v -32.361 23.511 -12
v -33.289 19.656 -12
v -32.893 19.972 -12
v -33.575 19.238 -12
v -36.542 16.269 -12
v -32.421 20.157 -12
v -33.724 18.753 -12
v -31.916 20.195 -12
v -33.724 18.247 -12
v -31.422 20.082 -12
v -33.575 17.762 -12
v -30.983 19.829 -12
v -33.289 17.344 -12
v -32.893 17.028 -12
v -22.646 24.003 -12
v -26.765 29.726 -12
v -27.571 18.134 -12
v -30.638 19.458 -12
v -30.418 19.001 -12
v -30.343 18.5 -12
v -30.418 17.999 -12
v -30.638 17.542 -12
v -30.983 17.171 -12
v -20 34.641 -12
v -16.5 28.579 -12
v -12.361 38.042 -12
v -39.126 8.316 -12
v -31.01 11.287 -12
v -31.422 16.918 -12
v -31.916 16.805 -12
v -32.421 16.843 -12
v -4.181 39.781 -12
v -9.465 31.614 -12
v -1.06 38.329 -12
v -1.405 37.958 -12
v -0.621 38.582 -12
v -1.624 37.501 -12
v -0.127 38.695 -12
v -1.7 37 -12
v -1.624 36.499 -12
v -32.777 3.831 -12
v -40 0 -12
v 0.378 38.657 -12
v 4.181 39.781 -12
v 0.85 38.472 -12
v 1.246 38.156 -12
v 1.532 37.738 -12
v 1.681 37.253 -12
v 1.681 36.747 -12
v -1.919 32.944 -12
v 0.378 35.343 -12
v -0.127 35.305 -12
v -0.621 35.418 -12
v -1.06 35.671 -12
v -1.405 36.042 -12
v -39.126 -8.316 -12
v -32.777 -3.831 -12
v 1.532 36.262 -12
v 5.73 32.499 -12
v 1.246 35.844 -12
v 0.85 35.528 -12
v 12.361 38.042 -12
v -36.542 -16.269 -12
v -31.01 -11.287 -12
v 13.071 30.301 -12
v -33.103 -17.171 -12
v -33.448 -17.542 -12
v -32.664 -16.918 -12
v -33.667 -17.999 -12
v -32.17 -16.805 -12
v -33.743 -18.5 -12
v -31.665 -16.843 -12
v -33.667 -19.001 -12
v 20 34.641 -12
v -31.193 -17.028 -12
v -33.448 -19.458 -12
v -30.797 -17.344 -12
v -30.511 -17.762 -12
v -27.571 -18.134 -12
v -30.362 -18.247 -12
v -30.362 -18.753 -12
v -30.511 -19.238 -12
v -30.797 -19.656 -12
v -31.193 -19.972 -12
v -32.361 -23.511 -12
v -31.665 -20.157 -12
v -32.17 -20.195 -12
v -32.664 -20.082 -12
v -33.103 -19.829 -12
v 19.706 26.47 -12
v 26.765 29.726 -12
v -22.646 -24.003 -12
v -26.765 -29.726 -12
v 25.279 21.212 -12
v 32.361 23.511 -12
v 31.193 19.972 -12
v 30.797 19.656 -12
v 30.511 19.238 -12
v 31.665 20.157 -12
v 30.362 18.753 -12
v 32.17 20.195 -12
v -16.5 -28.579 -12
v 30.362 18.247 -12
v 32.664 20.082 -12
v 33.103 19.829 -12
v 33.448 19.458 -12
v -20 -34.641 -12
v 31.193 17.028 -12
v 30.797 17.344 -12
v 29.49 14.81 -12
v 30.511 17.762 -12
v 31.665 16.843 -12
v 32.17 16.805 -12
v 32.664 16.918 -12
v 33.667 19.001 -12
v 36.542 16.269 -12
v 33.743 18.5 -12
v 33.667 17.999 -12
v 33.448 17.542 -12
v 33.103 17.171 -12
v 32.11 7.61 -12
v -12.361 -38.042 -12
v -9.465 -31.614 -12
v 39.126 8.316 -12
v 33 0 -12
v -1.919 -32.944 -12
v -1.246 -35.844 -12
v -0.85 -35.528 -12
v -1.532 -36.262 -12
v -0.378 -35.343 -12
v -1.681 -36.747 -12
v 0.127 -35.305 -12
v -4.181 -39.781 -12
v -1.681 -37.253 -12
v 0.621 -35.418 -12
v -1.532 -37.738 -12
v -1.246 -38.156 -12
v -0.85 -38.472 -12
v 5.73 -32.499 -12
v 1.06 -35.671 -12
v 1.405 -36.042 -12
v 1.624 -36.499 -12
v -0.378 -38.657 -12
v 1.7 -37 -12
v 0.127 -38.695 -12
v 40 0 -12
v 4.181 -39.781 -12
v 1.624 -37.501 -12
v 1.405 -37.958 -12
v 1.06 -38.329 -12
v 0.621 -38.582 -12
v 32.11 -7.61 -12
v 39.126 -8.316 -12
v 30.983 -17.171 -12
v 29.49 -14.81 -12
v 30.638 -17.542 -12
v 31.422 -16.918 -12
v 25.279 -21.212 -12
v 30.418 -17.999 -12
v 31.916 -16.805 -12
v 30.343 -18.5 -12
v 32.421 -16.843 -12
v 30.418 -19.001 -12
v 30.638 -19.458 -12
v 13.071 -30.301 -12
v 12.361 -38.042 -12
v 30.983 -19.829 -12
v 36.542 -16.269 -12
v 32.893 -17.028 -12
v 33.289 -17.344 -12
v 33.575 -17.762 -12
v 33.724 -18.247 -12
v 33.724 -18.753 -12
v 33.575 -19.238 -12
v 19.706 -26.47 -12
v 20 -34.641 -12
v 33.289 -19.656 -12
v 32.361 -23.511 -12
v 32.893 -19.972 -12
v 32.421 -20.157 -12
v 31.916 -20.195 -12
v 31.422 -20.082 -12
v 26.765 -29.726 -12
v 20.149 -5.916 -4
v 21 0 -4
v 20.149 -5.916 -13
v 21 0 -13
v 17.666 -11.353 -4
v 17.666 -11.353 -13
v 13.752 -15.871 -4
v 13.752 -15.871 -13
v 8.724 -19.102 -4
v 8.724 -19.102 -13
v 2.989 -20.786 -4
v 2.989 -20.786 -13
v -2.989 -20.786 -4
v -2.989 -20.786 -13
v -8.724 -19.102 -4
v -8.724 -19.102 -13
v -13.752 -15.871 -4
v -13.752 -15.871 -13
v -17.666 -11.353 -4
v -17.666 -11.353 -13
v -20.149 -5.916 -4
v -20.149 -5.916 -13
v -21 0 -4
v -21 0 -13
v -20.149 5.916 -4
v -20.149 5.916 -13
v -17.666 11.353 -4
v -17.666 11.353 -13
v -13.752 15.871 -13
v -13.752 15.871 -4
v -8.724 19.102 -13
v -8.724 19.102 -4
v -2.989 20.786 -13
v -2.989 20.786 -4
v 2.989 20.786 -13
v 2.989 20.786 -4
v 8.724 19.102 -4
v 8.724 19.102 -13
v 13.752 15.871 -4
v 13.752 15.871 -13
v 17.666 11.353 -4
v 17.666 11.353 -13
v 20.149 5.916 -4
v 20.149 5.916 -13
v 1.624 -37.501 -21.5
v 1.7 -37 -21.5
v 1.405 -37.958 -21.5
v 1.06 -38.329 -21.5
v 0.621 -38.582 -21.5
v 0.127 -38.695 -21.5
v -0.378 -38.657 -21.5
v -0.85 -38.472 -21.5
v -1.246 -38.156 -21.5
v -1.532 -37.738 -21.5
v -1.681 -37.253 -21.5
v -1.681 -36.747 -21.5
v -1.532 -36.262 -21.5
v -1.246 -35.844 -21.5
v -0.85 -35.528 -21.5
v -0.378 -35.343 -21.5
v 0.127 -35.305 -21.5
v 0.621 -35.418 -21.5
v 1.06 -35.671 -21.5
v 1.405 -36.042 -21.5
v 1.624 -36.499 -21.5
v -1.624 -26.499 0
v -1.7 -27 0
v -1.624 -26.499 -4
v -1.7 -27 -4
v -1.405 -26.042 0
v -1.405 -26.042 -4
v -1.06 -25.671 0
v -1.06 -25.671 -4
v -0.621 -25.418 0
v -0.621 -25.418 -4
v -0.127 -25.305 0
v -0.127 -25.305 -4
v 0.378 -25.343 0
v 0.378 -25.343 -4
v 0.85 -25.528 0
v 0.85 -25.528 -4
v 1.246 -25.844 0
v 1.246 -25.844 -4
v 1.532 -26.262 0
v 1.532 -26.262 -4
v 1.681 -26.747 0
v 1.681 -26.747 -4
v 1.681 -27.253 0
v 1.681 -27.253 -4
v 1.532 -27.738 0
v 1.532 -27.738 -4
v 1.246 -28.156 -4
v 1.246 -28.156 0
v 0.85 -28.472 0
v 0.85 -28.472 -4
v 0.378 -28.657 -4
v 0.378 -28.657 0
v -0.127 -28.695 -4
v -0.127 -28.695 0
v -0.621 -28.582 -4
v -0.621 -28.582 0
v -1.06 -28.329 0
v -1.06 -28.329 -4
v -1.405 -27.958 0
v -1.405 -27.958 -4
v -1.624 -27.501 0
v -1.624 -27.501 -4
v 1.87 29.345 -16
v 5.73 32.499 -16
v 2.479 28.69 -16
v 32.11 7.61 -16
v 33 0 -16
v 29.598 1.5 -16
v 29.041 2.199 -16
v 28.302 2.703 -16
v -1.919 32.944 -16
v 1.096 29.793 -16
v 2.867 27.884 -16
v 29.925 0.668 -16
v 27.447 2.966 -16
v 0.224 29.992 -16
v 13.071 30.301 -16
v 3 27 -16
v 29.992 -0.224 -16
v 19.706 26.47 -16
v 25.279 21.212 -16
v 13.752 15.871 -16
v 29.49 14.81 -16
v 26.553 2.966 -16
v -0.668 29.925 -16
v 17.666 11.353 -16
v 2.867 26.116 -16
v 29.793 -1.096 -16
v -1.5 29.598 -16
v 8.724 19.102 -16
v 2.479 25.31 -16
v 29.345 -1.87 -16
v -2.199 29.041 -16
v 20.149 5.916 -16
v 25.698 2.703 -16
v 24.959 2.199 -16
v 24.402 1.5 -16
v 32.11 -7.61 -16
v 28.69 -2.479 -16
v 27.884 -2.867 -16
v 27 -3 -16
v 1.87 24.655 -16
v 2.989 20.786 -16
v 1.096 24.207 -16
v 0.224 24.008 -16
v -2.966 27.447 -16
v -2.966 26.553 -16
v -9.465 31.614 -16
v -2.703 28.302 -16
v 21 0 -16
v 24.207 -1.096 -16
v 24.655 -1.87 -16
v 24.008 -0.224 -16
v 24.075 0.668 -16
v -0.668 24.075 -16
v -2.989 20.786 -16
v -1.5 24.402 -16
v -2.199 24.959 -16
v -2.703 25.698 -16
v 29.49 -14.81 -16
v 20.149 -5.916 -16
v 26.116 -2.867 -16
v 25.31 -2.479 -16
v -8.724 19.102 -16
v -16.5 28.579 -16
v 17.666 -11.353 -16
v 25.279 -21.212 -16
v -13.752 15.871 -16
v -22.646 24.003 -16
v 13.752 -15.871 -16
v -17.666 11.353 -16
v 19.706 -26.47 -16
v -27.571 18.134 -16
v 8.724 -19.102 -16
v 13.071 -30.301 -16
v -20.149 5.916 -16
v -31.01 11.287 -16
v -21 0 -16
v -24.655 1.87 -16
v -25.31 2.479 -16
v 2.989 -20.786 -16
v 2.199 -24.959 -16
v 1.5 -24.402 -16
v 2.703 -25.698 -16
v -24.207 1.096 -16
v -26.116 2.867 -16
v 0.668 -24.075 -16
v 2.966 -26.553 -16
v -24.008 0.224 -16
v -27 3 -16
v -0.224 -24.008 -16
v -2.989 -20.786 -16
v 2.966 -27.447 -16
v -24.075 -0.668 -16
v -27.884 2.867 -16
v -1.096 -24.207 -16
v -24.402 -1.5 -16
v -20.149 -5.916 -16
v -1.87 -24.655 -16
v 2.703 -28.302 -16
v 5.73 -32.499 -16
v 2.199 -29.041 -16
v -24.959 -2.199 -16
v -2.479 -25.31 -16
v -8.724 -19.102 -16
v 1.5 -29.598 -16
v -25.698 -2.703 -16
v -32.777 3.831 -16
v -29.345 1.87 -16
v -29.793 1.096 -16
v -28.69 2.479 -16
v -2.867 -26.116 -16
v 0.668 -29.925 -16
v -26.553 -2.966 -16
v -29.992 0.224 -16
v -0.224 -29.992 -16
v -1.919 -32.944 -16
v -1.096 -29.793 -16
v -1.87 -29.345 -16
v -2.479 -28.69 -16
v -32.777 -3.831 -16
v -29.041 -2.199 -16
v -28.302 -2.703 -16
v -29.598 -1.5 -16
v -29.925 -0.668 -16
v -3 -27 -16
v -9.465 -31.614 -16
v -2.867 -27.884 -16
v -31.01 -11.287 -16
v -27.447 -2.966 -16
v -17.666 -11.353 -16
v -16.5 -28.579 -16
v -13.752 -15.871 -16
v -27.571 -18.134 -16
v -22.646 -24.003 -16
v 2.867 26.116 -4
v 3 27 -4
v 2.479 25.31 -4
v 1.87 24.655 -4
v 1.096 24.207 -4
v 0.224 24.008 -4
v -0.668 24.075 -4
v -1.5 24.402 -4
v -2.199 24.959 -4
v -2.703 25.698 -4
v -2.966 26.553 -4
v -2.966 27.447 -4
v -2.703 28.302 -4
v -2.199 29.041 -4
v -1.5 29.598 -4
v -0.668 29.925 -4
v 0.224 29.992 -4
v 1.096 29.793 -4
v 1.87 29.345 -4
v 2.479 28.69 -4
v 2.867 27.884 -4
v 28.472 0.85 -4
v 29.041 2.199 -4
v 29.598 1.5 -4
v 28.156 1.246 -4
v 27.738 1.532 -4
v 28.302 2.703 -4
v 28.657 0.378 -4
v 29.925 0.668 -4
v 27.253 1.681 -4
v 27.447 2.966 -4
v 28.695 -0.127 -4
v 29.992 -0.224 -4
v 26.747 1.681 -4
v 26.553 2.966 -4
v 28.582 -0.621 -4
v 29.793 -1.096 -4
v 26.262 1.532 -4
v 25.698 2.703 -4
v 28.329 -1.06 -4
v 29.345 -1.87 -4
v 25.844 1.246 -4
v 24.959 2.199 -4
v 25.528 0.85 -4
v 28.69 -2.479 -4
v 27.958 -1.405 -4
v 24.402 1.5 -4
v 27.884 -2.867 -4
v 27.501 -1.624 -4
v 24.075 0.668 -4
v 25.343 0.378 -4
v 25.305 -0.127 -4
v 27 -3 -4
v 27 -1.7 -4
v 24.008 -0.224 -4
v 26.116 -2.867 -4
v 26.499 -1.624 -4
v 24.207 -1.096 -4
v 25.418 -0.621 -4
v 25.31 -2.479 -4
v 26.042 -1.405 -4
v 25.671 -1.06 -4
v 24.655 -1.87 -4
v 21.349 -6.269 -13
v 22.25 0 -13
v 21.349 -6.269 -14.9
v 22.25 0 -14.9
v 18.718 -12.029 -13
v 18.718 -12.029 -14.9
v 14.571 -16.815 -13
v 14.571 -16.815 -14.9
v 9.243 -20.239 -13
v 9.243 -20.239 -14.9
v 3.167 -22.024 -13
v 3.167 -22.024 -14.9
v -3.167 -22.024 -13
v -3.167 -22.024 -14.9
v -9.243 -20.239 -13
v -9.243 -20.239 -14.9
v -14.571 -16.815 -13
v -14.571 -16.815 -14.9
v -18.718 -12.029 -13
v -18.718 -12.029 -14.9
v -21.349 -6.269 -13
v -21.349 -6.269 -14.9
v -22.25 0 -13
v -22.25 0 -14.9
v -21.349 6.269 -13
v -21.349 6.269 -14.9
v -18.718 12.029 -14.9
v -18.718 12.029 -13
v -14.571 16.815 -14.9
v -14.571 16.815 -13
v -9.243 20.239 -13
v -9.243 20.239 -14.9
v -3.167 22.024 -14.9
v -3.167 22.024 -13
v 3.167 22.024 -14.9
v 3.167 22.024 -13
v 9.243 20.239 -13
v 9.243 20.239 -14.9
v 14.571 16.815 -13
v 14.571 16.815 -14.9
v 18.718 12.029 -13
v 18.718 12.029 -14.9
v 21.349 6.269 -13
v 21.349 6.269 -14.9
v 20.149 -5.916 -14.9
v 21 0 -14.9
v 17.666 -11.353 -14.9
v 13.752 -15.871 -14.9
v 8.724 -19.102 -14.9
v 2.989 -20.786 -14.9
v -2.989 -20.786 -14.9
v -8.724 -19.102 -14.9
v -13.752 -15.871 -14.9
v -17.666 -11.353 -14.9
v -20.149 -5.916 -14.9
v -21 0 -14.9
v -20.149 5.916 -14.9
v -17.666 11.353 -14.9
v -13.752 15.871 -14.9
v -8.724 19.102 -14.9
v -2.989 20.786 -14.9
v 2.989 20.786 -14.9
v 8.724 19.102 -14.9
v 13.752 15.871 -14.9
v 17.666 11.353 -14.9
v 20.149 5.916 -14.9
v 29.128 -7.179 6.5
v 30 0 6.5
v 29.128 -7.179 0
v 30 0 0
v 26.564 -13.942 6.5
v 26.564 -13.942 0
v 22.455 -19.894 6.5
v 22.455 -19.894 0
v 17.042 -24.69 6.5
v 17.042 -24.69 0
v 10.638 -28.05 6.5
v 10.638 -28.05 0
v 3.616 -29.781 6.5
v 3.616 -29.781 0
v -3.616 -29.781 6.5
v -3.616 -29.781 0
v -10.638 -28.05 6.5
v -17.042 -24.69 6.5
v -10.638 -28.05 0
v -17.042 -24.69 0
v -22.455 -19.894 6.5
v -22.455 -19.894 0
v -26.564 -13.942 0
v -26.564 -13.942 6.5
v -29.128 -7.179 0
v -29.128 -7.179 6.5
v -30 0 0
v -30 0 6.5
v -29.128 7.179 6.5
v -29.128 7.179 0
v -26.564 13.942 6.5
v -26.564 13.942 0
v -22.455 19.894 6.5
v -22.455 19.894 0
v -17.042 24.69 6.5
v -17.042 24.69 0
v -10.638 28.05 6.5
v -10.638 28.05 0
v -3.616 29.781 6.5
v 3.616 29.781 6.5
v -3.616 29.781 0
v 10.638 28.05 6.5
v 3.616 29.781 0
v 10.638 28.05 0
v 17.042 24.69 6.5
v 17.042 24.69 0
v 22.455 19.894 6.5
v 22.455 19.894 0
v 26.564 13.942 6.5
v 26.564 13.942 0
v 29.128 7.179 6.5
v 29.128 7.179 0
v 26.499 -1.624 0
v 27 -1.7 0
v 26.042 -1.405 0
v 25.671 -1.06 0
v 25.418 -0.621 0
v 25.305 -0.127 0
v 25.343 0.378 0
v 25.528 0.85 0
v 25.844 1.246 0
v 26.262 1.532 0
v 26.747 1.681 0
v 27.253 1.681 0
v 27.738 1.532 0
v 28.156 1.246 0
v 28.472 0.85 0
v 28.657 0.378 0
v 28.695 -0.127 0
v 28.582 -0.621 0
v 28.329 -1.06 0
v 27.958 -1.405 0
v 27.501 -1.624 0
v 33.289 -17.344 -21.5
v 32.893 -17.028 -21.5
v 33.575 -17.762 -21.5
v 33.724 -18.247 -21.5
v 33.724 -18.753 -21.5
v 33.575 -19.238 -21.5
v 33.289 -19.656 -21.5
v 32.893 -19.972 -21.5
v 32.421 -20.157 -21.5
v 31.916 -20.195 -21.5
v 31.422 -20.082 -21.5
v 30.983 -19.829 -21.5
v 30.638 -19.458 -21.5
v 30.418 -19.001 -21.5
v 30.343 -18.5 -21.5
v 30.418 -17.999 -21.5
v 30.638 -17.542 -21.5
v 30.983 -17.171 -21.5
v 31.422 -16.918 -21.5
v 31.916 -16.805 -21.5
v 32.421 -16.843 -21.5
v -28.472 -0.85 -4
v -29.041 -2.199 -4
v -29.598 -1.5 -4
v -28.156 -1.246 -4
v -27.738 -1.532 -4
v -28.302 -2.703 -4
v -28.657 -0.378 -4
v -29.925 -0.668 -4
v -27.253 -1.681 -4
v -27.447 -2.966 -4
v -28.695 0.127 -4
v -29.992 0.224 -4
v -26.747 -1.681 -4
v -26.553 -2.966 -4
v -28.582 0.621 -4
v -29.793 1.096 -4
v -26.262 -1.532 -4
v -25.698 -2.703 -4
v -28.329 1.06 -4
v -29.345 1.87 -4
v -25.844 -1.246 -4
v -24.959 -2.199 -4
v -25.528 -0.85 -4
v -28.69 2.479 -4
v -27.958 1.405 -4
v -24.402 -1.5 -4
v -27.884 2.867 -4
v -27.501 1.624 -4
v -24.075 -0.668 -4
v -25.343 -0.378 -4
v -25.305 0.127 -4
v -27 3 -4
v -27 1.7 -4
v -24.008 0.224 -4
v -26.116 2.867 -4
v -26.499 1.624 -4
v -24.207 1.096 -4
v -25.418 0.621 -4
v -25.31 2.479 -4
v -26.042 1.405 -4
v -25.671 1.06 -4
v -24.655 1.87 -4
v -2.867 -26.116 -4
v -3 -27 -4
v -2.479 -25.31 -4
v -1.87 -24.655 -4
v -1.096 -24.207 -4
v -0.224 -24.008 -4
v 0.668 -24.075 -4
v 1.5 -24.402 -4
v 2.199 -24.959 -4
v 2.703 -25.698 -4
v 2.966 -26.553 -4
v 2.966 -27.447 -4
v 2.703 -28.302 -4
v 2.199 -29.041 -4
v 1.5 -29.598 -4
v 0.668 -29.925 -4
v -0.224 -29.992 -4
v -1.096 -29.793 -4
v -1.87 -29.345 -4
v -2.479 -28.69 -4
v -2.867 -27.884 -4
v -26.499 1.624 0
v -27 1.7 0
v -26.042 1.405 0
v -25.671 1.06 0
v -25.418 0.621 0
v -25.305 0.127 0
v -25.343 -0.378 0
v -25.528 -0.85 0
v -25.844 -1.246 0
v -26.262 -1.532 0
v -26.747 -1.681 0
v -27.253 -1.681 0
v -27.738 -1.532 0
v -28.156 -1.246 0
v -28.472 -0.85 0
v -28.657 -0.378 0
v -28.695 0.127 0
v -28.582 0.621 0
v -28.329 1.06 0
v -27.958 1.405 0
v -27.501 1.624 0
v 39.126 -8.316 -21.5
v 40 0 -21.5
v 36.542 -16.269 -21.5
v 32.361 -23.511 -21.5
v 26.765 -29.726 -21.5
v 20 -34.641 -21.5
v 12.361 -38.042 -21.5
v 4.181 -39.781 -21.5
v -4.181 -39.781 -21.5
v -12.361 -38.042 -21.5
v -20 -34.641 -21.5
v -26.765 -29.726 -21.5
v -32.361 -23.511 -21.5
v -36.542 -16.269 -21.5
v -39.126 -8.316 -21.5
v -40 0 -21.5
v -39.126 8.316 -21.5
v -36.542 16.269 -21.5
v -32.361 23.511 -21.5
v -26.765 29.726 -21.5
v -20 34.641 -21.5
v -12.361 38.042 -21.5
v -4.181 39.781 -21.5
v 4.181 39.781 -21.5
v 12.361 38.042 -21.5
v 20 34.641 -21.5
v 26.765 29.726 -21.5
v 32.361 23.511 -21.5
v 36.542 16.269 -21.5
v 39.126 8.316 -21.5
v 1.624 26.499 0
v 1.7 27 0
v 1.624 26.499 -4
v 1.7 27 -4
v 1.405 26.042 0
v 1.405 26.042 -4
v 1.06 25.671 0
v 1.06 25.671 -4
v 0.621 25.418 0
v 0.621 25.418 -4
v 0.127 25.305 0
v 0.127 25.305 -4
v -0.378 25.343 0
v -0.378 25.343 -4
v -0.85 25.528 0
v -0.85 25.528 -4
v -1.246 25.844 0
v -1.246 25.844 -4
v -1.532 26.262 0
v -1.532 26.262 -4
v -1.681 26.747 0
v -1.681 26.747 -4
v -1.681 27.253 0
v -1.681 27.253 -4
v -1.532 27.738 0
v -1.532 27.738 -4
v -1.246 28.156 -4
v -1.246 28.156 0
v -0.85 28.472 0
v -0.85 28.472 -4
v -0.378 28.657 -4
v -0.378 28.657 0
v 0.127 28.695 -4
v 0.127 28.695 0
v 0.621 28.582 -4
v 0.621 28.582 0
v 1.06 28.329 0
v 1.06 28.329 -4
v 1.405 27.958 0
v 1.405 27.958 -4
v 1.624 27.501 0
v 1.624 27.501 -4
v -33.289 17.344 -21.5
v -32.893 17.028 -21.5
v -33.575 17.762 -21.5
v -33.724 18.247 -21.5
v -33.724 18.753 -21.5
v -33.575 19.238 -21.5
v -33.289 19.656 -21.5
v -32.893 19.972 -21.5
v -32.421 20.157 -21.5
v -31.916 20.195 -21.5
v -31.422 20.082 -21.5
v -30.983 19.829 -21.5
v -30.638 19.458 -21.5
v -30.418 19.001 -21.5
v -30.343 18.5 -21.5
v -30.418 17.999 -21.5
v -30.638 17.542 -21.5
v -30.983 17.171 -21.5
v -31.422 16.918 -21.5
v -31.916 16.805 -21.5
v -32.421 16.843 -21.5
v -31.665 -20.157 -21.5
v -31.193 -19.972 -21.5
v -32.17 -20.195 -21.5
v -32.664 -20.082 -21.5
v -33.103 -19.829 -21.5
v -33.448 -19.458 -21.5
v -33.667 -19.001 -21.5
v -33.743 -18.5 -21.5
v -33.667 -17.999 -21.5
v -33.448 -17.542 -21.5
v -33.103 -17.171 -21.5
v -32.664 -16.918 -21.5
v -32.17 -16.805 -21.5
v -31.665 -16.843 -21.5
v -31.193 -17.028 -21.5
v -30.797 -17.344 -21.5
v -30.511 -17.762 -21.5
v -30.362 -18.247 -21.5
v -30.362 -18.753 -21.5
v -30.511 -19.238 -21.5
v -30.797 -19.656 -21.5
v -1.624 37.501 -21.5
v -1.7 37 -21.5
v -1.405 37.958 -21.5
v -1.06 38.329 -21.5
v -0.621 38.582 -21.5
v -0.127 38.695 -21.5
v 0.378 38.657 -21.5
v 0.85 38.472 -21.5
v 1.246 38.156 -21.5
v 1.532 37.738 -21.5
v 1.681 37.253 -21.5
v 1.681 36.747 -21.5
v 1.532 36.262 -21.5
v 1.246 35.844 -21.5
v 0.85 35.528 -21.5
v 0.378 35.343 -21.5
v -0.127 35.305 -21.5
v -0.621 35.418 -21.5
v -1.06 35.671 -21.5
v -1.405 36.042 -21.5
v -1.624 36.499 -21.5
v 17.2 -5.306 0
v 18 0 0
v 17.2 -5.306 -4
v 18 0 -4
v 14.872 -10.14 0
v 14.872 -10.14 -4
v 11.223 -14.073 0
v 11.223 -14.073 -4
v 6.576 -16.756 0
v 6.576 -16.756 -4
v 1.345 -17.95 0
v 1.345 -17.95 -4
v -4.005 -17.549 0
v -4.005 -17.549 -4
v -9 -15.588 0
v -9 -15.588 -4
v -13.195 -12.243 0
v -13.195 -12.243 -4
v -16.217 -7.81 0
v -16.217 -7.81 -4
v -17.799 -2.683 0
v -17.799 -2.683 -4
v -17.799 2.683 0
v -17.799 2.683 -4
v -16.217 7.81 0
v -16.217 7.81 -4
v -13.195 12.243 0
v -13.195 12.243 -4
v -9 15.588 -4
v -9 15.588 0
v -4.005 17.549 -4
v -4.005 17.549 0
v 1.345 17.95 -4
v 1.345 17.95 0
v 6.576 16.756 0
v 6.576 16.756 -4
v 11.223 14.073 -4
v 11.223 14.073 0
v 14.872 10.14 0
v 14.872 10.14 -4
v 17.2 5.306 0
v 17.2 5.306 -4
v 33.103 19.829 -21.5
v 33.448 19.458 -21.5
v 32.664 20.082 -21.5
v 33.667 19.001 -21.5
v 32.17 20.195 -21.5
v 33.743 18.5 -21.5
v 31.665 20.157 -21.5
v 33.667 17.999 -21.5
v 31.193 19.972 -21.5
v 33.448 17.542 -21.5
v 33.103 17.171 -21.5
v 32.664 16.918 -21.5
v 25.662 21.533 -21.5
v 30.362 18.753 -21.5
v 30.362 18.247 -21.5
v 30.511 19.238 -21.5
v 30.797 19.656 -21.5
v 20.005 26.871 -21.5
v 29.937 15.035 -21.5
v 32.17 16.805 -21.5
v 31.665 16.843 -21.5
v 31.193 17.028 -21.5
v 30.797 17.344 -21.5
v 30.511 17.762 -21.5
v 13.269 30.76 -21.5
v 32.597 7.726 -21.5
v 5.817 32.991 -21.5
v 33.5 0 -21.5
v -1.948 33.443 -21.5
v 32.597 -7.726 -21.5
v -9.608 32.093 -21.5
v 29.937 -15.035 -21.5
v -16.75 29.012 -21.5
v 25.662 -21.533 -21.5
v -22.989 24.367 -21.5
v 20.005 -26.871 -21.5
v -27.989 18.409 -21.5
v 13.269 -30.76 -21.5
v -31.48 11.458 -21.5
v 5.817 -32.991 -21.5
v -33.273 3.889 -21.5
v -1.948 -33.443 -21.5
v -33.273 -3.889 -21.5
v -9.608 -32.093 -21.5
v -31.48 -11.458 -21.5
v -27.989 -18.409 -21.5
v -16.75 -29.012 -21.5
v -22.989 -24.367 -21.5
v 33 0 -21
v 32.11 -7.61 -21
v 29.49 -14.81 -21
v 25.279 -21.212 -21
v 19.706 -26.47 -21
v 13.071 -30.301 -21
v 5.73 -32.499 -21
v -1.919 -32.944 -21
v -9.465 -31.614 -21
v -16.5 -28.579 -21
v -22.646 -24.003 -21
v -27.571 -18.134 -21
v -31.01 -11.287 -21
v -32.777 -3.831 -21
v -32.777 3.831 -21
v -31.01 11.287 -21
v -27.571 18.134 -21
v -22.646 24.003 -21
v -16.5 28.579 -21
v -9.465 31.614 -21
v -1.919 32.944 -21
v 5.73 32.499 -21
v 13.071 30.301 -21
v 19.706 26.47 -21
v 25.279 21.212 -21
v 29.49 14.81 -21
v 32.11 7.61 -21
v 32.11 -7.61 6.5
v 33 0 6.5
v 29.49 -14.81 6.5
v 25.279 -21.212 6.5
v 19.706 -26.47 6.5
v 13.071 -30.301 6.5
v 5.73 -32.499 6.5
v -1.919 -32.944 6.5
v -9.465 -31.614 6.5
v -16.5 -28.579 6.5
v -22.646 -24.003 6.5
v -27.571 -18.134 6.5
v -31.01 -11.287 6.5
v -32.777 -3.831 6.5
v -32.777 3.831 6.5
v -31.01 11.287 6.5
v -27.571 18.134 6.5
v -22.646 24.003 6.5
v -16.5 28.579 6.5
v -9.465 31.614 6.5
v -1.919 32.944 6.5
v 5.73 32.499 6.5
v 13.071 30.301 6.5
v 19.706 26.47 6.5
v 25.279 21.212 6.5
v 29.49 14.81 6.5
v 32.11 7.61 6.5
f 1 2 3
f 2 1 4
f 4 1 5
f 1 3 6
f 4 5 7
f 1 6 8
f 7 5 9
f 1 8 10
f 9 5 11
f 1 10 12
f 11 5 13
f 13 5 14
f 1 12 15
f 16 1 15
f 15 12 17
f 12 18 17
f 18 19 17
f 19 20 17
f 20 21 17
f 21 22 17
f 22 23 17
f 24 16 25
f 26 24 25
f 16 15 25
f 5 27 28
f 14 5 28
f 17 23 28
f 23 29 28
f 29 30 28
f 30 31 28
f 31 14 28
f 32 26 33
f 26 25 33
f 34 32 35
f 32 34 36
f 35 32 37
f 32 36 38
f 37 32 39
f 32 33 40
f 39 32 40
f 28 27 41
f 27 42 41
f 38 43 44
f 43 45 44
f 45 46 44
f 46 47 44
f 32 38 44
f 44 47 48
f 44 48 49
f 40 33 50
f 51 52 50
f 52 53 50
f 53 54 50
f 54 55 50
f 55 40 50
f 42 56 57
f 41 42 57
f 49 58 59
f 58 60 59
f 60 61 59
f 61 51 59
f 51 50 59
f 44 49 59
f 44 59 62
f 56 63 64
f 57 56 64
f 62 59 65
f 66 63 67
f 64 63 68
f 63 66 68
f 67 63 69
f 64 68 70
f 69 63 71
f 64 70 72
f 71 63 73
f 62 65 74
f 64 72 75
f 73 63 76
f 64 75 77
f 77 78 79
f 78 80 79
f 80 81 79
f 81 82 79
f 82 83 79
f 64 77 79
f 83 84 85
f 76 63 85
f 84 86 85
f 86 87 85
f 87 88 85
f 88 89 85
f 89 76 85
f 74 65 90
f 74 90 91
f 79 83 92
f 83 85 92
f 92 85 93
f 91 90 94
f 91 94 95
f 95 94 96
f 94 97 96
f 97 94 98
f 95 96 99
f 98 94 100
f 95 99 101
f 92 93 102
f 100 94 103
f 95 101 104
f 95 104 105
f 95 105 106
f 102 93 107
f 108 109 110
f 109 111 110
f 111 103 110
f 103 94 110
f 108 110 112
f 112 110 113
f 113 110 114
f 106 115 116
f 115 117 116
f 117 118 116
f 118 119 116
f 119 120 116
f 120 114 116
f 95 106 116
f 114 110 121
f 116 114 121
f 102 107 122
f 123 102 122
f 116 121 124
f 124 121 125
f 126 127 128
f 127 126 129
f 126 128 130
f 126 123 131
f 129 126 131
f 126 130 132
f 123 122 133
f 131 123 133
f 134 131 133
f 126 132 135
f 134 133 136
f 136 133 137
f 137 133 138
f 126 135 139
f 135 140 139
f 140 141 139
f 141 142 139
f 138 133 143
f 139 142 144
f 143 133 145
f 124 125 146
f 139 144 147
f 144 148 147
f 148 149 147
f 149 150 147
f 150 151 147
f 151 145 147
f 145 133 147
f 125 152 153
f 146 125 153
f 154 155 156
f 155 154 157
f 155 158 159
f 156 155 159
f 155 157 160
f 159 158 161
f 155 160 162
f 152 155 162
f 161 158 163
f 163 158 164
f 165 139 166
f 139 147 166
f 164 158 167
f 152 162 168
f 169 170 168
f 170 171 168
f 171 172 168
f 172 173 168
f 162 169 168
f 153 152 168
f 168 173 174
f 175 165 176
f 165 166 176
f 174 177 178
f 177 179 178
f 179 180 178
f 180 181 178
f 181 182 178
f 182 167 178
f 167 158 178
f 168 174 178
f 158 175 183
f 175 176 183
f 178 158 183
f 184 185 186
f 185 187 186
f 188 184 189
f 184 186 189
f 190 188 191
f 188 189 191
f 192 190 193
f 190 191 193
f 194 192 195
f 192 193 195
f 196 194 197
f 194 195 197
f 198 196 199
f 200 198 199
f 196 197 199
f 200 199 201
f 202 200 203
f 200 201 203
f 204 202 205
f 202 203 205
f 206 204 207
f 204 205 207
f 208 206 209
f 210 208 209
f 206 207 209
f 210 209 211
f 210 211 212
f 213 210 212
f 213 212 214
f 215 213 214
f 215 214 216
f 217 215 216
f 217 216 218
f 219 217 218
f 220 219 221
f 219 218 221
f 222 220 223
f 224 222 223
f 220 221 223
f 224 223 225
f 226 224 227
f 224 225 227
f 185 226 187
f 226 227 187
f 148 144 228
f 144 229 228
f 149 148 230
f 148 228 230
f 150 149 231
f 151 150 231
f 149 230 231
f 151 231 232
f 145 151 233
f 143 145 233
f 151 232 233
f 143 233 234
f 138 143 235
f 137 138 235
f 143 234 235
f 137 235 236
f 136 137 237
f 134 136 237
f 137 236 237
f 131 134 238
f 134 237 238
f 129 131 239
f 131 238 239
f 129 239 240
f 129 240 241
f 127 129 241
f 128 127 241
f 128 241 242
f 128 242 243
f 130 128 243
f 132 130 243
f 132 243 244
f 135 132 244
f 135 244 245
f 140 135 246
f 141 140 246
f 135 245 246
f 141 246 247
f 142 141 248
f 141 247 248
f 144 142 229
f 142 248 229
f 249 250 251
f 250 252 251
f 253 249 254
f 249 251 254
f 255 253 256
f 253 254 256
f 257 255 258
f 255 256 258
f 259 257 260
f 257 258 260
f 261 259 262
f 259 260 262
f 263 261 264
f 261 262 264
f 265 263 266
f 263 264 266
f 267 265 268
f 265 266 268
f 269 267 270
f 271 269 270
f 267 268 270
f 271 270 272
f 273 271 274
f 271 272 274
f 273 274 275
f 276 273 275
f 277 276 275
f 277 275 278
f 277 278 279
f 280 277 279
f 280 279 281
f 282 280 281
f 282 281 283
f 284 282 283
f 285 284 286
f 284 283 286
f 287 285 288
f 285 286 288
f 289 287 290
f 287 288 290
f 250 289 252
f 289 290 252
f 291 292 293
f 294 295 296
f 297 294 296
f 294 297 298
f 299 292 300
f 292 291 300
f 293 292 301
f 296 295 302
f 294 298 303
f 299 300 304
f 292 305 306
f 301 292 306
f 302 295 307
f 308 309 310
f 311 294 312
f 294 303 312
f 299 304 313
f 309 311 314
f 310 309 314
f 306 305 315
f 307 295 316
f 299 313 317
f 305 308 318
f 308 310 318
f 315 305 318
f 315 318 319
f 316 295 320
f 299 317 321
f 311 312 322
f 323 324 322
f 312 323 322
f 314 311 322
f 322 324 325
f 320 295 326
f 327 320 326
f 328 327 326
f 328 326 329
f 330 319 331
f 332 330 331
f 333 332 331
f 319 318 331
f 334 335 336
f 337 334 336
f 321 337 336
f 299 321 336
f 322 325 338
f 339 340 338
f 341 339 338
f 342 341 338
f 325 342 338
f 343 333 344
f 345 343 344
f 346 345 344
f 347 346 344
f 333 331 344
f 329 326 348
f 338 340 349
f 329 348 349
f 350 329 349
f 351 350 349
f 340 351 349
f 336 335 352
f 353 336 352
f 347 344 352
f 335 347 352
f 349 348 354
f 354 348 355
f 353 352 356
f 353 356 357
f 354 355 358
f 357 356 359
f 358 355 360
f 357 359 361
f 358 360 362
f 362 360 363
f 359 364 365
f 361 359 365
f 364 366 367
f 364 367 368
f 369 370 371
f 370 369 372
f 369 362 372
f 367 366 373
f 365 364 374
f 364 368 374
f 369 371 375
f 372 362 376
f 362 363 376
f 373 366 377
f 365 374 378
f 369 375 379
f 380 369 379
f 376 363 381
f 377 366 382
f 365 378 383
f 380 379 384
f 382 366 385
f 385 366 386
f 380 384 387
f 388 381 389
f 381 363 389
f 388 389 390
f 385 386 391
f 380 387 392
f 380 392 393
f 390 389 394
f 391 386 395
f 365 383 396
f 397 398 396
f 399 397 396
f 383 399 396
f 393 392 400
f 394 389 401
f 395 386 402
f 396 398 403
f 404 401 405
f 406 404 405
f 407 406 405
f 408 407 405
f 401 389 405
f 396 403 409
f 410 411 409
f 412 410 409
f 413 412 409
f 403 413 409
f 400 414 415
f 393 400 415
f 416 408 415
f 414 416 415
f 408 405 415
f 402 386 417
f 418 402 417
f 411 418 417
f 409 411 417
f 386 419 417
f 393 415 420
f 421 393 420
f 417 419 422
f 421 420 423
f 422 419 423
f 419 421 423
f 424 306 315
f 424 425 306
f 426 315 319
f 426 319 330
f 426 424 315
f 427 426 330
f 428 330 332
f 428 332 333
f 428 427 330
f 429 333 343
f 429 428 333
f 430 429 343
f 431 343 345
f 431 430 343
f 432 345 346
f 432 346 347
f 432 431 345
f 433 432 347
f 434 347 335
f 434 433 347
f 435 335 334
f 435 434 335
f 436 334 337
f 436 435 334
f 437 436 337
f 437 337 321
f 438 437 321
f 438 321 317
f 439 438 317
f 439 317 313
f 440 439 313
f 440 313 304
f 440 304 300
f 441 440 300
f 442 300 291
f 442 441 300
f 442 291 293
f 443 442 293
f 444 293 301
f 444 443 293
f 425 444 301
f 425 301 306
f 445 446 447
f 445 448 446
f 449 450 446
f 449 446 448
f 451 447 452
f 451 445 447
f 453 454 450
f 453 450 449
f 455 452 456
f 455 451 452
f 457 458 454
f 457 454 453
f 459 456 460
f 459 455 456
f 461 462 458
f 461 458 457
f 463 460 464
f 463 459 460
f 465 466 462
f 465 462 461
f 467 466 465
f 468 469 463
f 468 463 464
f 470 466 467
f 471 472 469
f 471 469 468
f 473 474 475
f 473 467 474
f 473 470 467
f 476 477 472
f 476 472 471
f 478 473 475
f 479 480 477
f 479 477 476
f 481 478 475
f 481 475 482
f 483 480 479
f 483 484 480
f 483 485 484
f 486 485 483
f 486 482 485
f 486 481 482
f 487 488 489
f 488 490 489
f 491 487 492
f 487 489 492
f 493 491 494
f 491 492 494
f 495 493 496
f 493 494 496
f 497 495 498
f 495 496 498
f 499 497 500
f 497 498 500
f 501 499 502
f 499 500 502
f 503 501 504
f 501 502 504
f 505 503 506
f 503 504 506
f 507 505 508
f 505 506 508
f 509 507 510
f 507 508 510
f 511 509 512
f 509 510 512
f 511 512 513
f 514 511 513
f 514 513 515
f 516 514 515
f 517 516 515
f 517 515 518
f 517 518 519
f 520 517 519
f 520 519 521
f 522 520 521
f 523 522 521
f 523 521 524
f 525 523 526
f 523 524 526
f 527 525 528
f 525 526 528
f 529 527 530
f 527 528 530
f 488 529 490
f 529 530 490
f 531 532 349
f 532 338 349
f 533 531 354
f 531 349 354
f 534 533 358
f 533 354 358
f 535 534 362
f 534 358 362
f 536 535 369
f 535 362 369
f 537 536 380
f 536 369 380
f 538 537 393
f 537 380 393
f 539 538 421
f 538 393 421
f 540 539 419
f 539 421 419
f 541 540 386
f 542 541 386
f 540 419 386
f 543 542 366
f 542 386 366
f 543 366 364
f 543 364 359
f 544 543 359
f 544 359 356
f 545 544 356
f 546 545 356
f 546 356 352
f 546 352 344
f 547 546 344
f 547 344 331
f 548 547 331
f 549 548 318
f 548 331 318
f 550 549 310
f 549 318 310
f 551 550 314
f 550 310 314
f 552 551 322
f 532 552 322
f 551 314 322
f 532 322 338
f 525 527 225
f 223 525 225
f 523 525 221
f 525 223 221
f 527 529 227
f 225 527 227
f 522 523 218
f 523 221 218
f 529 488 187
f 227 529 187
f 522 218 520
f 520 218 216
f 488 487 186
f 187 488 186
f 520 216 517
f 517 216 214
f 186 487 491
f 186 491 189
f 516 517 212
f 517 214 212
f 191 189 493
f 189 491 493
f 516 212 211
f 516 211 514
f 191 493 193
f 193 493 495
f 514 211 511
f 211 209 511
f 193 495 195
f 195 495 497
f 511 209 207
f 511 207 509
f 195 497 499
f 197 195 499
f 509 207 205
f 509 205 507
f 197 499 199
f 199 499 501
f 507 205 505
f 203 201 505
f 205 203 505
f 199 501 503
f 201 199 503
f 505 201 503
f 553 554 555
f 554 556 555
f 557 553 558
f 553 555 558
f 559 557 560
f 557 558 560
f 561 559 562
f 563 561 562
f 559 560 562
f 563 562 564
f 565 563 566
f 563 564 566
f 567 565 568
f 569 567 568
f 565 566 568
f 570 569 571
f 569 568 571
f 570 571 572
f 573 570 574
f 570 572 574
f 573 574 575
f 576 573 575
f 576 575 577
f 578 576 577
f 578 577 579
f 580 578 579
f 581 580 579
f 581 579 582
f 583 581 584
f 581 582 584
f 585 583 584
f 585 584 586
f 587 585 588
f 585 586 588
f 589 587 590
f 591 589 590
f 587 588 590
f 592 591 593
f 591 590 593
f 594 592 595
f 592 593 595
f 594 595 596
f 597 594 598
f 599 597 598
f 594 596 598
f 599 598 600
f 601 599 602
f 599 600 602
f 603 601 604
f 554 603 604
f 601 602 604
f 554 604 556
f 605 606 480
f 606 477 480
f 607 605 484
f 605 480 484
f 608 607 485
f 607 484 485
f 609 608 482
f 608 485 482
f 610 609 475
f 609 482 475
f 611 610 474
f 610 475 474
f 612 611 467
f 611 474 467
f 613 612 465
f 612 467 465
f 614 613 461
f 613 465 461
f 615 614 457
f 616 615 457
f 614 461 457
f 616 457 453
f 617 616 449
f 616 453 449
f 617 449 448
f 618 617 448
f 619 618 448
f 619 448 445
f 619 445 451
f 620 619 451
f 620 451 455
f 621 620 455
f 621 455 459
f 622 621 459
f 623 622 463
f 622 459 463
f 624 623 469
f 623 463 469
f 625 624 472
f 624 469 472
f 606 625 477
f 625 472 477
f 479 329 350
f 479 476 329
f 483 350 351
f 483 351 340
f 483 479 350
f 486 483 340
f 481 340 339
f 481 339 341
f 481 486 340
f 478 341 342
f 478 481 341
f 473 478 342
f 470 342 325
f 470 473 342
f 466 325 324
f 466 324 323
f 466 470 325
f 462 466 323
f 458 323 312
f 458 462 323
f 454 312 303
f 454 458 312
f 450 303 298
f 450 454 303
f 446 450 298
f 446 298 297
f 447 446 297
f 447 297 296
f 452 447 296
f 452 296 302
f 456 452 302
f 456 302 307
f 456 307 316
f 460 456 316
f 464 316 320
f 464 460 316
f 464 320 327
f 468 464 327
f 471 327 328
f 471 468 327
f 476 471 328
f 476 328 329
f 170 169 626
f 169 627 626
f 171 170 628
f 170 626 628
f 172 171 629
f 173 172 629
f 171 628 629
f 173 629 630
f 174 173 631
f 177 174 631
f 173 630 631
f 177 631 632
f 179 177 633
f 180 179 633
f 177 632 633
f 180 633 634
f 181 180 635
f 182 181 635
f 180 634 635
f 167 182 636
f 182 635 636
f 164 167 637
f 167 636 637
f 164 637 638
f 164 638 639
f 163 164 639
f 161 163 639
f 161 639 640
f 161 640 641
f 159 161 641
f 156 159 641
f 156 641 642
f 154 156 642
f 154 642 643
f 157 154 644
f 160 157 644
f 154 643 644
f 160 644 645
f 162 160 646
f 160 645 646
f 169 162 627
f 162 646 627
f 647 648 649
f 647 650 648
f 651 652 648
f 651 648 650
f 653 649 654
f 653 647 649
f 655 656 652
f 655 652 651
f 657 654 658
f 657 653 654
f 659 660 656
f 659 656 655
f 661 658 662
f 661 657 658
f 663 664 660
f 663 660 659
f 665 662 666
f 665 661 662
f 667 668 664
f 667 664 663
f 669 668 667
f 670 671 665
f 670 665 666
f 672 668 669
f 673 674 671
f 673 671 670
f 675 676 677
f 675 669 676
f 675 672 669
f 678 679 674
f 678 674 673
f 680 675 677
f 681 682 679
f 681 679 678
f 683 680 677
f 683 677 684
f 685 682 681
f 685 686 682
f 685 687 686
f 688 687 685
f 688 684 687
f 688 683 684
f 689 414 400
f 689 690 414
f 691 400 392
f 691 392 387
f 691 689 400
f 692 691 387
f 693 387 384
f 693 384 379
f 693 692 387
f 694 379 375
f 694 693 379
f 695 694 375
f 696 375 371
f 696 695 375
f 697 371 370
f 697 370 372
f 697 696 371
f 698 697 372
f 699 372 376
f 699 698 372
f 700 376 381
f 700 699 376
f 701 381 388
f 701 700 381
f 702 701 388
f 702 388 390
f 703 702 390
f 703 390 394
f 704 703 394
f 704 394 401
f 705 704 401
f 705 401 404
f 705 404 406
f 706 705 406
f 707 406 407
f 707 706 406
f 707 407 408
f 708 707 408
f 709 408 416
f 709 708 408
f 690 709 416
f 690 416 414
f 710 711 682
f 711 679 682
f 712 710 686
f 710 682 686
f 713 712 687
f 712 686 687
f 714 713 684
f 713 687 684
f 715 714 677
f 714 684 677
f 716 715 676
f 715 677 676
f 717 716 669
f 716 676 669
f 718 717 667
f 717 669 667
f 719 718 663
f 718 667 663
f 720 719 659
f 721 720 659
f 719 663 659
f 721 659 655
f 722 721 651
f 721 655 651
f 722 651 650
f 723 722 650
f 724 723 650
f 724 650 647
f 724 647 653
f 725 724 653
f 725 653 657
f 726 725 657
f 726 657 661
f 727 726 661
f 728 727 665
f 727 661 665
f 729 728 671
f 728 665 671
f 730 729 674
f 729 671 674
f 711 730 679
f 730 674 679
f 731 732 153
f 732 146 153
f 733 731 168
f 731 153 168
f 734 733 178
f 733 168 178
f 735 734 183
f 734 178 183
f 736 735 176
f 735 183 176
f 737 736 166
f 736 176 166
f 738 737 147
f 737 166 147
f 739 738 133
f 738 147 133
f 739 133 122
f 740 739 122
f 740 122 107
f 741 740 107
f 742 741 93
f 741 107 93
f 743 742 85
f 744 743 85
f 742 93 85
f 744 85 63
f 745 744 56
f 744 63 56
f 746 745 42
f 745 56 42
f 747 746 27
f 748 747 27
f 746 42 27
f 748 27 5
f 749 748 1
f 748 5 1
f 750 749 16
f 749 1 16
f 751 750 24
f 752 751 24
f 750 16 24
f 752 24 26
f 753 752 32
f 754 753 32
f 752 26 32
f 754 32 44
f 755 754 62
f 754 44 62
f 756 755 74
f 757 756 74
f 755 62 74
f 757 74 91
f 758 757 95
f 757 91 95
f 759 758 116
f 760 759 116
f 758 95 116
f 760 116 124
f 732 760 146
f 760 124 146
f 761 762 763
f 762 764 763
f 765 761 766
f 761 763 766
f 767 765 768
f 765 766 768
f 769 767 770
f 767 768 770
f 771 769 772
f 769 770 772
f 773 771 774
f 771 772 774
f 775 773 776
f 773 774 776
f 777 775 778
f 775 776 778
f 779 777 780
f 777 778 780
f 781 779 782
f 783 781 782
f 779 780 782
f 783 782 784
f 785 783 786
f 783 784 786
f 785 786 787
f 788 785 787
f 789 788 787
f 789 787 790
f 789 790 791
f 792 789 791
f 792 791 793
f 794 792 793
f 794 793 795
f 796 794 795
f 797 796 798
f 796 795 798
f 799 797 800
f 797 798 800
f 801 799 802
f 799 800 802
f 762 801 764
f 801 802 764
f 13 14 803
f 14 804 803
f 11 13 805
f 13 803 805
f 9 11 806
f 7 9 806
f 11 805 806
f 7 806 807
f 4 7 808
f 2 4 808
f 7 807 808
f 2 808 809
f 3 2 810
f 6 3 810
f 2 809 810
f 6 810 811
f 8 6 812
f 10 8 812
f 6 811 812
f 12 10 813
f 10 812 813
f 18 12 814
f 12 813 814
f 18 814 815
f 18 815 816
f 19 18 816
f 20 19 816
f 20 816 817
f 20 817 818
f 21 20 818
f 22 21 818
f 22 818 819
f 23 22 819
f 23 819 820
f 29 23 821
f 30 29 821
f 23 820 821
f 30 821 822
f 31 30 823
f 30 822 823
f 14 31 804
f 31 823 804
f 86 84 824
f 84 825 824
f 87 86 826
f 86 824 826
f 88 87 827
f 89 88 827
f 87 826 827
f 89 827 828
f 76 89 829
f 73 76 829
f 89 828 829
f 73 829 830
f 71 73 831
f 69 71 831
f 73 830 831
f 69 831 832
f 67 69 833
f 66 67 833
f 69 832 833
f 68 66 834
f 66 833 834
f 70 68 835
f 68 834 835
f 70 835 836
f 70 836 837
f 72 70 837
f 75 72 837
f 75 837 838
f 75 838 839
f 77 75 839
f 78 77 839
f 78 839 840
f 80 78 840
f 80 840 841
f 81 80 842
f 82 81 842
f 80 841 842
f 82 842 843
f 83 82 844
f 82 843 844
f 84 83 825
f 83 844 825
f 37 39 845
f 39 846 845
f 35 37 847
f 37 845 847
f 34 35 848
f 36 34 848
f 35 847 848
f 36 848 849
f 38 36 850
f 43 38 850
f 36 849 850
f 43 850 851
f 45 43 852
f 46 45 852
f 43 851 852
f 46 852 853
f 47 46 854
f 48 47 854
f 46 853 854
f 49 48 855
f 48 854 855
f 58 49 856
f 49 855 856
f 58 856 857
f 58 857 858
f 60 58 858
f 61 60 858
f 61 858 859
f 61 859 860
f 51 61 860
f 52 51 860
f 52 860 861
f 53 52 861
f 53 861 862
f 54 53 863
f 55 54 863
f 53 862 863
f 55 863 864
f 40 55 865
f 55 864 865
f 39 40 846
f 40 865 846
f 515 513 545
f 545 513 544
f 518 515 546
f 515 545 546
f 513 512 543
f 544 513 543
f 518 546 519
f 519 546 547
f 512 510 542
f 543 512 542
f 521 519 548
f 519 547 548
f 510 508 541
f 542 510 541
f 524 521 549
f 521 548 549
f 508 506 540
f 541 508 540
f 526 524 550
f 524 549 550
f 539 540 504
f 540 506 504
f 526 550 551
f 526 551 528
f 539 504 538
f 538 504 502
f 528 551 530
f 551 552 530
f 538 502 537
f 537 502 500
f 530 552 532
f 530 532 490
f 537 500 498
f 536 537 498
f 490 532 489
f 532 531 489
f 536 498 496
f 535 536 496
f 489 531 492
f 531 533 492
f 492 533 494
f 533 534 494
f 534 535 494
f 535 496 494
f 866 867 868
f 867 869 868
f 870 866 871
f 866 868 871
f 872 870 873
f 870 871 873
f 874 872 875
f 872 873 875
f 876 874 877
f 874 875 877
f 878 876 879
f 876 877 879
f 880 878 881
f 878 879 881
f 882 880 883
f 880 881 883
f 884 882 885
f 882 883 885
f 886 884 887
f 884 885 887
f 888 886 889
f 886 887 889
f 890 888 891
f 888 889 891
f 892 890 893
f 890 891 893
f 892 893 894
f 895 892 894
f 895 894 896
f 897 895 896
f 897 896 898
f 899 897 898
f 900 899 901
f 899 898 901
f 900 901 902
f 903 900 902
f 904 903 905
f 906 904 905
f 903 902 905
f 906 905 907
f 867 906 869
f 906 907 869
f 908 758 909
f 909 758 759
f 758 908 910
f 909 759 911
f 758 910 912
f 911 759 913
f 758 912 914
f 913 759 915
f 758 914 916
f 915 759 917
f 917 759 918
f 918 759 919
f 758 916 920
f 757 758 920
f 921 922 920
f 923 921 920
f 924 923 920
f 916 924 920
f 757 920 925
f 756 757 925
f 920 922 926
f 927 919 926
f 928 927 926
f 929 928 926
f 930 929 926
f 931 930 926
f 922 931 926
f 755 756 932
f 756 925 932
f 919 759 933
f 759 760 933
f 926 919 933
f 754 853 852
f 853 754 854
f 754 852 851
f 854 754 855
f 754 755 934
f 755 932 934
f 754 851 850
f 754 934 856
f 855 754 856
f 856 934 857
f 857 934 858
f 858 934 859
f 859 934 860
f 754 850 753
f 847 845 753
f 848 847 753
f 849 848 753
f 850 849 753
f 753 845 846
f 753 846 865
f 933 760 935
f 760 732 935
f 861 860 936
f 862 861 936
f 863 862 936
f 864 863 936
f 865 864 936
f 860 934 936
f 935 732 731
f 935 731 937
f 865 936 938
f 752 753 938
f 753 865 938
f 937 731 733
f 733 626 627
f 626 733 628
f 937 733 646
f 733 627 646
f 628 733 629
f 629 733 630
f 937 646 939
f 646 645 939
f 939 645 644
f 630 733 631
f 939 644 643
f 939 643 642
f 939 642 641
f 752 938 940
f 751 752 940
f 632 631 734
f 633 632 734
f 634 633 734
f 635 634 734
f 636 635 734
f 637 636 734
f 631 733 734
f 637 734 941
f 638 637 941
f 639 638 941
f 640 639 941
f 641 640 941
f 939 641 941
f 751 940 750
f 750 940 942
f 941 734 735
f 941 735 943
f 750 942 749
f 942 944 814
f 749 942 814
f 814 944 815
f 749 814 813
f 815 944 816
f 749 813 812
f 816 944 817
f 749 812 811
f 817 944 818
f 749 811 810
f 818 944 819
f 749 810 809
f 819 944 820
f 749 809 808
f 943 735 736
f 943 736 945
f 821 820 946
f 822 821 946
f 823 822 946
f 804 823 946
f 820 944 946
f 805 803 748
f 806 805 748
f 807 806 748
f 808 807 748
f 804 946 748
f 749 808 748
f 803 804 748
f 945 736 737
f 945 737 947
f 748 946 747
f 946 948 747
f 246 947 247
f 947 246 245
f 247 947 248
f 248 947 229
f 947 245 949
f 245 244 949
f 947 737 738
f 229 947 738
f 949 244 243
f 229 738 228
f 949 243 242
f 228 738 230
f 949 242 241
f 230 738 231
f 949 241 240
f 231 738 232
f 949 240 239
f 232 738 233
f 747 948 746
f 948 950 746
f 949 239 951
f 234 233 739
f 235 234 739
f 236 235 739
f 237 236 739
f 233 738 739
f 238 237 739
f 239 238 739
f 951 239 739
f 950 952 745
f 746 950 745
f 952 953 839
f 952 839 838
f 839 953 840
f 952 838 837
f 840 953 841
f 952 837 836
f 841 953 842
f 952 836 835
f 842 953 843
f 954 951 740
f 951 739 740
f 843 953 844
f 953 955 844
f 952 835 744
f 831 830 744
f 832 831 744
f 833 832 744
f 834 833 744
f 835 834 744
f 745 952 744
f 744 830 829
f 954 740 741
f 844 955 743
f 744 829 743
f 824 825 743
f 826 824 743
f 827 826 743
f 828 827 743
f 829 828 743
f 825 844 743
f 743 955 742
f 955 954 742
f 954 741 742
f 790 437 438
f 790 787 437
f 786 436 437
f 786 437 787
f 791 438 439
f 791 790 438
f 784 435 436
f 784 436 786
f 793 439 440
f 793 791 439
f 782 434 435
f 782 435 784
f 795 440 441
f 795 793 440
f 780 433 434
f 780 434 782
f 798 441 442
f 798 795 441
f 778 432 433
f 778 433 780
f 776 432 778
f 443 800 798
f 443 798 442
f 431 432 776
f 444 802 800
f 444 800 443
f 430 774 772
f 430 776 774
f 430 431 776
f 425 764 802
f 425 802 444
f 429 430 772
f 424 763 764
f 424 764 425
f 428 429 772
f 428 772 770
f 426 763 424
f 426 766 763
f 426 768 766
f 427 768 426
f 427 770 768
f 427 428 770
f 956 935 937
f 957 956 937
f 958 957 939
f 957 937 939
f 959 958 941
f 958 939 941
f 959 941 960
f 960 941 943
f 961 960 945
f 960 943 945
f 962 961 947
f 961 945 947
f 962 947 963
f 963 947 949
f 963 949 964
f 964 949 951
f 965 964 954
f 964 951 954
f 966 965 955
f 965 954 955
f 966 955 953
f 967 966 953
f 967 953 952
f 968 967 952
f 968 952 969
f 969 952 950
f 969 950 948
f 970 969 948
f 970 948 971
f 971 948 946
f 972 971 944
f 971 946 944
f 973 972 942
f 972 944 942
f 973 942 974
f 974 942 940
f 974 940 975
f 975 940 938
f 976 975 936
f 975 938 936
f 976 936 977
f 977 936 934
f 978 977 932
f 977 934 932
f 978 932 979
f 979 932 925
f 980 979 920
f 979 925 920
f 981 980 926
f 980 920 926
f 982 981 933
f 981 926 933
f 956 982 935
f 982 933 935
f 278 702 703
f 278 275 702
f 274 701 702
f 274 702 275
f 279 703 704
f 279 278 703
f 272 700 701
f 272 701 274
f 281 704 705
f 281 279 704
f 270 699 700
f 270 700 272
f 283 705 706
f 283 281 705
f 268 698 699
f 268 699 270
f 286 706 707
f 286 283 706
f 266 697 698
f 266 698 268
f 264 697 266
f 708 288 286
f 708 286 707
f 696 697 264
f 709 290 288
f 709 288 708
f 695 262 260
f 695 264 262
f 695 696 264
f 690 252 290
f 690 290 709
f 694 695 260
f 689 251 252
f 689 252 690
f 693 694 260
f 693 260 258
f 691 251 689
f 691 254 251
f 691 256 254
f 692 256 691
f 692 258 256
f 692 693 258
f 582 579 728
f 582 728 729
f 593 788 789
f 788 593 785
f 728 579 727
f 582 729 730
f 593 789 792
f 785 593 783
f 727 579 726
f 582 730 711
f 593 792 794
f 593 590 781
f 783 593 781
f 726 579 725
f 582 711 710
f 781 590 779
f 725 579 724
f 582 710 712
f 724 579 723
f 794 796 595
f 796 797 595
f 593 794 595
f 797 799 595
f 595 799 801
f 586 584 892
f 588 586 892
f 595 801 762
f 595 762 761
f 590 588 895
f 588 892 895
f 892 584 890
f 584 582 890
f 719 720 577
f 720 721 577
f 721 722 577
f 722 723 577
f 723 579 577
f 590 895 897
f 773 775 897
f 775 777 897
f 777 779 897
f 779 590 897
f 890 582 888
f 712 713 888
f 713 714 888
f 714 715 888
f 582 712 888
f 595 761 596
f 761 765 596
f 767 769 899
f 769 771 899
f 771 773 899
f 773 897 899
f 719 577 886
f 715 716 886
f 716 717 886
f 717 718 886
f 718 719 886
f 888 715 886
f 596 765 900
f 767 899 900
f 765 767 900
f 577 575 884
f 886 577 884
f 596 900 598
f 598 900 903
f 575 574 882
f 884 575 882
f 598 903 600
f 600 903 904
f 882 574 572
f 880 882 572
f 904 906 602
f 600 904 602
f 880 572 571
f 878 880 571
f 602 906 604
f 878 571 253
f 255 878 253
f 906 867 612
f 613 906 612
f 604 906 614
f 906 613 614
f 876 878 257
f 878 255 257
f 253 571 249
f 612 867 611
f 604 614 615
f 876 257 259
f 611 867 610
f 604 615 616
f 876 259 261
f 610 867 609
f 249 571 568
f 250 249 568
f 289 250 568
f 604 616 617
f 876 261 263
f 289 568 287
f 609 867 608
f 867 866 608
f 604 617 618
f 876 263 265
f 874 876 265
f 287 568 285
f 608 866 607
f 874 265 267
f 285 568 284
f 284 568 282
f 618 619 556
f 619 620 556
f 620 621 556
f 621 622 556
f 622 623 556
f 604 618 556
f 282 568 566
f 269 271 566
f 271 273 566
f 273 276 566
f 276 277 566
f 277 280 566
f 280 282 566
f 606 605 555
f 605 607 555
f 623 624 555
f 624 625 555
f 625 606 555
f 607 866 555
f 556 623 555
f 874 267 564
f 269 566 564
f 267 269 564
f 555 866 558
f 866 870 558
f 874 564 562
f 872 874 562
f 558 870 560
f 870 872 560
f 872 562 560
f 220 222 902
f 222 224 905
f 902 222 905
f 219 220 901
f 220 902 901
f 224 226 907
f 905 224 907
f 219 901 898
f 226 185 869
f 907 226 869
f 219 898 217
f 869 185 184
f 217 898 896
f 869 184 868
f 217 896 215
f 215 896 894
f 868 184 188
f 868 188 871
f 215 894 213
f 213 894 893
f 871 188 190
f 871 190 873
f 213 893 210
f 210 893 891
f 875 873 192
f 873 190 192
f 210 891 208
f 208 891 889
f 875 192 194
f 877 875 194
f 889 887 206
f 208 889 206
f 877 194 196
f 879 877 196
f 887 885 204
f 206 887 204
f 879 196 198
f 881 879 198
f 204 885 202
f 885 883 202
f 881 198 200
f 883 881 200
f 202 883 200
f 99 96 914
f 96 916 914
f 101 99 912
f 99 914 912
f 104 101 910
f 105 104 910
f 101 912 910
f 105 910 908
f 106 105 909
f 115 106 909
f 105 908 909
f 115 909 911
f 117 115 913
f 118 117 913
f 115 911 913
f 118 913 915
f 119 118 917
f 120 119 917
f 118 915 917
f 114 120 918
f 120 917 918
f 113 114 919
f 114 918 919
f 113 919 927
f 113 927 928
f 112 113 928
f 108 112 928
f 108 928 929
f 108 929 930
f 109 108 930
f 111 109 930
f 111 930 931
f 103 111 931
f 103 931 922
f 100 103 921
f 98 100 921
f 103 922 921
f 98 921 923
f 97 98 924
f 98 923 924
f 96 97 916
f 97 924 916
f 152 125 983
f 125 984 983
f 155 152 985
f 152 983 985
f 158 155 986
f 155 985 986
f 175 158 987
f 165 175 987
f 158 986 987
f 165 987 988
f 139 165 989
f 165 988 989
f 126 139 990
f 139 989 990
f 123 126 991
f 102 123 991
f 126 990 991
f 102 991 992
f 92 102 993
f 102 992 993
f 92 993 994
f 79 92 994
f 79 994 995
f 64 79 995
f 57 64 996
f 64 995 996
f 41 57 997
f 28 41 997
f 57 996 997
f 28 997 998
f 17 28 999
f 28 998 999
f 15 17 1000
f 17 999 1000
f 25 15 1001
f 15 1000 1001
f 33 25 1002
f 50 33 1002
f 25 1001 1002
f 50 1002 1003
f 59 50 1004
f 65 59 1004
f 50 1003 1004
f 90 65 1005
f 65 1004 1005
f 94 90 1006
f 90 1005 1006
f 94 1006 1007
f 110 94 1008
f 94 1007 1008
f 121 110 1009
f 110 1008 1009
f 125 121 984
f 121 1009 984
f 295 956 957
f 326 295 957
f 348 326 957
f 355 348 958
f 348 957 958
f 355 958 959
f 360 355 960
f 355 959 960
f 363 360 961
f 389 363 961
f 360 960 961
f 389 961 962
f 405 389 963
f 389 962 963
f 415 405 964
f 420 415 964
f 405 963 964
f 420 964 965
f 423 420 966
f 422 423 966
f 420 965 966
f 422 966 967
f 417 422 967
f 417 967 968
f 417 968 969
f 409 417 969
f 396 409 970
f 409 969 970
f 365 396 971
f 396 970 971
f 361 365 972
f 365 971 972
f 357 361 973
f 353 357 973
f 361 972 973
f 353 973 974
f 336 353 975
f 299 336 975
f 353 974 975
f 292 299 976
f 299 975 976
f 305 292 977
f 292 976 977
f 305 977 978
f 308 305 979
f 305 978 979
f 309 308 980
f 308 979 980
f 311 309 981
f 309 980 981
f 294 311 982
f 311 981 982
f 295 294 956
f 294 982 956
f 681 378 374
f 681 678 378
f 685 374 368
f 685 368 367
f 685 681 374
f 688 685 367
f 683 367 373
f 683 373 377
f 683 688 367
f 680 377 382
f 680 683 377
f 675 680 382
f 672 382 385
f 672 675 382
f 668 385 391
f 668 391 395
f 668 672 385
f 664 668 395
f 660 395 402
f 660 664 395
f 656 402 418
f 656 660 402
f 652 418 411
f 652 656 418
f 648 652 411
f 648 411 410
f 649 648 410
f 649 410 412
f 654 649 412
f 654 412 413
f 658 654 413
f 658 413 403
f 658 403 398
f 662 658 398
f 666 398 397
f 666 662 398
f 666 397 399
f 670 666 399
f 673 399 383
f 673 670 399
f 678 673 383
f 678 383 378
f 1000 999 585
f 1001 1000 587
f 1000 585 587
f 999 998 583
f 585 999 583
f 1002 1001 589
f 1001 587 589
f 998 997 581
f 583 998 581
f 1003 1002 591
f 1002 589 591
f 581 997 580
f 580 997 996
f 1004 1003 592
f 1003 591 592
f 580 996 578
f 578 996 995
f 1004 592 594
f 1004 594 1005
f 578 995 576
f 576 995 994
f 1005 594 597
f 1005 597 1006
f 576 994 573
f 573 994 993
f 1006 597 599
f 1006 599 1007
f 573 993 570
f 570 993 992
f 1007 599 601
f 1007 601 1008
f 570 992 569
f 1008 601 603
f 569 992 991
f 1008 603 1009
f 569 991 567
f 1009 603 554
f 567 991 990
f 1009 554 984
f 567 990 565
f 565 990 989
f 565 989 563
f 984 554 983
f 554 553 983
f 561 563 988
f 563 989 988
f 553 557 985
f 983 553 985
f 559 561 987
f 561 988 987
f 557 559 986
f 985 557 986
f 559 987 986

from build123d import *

# Parameters (mm, degrees)
SKETCH_6_R               = 1.7
CUT_EXTRUDE_1_DEPTH      = 64.118935352
PATTERN_CIRCULAR_1_COUNT = 6
CHAMFER_1_SIZE           = 0.5
PATTERN_CIRCULAR_2_COUNT = 4


with BuildPart() as part:
    # 草图1 → 旋转1 (revolve)
    with BuildSketch(Plane(origin=(0, 0, 0), x_dir=(0, 0, -1), z_dir=(1, 0, 0))):
        Polygon((0, 30), (0, 18), (4, 18), (4, 21), (13, 21), (13, 22.25), (14.9, 22.25), (14.9, 21), (16, 21), (16, 33), (21.5, 33), (21.5, 40), (12, 40), (12, 33), (-6.5, 33), (-6.5, 30), align=None)
    revolve(axis=Axis((0, 0, 0), (0, 0, -1)))

    # 草图2 → 切除-旋转2 (revolve, cut)
    with BuildSketch(Plane(origin=(0, 0, 0), x_dir=(0, 0, -1), z_dir=(1, 0, 0))):
        Polygon((0, 27), (16, 27), (16, 30), (4, 30), (4, 28.7), (0, 28.7), align=None)
    cut_revolve_2 = revolve(axis=Axis((0, 27, 0), (0, 0, -1)), mode=Mode.SUBTRACT)

    # 草图6 → 切除-拉伸1 (cut, symmetric)
    with BuildSketch(Plane(origin=(0, 0, -21.5), x_dir=(-1, 0, 0), z_dir=(0, 0, -1))):
        with Locations((0, 37)):
            Circle(SKETCH_6_R)
    cut_extrude_1 = extrude(amount=CUT_EXTRUDE_1_DEPTH, both=True, mode=Mode.SUBTRACT)

    # 阵列(圆周)1: 切除-拉伸1 ×6 about axis
    pattern_circular_1_axis = Axis((0, 0, -22.986810874), (0, 0, 1))
    for i in range(1, PATTERN_CIRCULAR_1_COUNT):
        add(cut_extrude_1.rotate(pattern_circular_1_axis, i * 360 / PATTERN_CIRCULAR_1_COUNT), mode=Mode.SUBTRACT)

    # 倒角1
    chamfer_1_edges = [part.edges().sort_by_distance(p)[0] for p in [
        (0, -33, -21.5),
    ]]
    chamfer(chamfer_1_edges, length=CHAMFER_1_SIZE)

    # 阵列(圆周)2: 切除-旋转2 ×4 about axis
    pattern_circular_2_axis = Axis((0, 0, -16), (0, 0, 1))
    for i in range(1, PATTERN_CIRCULAR_2_COUNT):
        add(cut_revolve_2.rotate(pattern_circular_2_axis, i * 360 / PATTERN_CIRCULAR_2_COUNT), mode=Mode.SUBTRACT)


solid = part.part
